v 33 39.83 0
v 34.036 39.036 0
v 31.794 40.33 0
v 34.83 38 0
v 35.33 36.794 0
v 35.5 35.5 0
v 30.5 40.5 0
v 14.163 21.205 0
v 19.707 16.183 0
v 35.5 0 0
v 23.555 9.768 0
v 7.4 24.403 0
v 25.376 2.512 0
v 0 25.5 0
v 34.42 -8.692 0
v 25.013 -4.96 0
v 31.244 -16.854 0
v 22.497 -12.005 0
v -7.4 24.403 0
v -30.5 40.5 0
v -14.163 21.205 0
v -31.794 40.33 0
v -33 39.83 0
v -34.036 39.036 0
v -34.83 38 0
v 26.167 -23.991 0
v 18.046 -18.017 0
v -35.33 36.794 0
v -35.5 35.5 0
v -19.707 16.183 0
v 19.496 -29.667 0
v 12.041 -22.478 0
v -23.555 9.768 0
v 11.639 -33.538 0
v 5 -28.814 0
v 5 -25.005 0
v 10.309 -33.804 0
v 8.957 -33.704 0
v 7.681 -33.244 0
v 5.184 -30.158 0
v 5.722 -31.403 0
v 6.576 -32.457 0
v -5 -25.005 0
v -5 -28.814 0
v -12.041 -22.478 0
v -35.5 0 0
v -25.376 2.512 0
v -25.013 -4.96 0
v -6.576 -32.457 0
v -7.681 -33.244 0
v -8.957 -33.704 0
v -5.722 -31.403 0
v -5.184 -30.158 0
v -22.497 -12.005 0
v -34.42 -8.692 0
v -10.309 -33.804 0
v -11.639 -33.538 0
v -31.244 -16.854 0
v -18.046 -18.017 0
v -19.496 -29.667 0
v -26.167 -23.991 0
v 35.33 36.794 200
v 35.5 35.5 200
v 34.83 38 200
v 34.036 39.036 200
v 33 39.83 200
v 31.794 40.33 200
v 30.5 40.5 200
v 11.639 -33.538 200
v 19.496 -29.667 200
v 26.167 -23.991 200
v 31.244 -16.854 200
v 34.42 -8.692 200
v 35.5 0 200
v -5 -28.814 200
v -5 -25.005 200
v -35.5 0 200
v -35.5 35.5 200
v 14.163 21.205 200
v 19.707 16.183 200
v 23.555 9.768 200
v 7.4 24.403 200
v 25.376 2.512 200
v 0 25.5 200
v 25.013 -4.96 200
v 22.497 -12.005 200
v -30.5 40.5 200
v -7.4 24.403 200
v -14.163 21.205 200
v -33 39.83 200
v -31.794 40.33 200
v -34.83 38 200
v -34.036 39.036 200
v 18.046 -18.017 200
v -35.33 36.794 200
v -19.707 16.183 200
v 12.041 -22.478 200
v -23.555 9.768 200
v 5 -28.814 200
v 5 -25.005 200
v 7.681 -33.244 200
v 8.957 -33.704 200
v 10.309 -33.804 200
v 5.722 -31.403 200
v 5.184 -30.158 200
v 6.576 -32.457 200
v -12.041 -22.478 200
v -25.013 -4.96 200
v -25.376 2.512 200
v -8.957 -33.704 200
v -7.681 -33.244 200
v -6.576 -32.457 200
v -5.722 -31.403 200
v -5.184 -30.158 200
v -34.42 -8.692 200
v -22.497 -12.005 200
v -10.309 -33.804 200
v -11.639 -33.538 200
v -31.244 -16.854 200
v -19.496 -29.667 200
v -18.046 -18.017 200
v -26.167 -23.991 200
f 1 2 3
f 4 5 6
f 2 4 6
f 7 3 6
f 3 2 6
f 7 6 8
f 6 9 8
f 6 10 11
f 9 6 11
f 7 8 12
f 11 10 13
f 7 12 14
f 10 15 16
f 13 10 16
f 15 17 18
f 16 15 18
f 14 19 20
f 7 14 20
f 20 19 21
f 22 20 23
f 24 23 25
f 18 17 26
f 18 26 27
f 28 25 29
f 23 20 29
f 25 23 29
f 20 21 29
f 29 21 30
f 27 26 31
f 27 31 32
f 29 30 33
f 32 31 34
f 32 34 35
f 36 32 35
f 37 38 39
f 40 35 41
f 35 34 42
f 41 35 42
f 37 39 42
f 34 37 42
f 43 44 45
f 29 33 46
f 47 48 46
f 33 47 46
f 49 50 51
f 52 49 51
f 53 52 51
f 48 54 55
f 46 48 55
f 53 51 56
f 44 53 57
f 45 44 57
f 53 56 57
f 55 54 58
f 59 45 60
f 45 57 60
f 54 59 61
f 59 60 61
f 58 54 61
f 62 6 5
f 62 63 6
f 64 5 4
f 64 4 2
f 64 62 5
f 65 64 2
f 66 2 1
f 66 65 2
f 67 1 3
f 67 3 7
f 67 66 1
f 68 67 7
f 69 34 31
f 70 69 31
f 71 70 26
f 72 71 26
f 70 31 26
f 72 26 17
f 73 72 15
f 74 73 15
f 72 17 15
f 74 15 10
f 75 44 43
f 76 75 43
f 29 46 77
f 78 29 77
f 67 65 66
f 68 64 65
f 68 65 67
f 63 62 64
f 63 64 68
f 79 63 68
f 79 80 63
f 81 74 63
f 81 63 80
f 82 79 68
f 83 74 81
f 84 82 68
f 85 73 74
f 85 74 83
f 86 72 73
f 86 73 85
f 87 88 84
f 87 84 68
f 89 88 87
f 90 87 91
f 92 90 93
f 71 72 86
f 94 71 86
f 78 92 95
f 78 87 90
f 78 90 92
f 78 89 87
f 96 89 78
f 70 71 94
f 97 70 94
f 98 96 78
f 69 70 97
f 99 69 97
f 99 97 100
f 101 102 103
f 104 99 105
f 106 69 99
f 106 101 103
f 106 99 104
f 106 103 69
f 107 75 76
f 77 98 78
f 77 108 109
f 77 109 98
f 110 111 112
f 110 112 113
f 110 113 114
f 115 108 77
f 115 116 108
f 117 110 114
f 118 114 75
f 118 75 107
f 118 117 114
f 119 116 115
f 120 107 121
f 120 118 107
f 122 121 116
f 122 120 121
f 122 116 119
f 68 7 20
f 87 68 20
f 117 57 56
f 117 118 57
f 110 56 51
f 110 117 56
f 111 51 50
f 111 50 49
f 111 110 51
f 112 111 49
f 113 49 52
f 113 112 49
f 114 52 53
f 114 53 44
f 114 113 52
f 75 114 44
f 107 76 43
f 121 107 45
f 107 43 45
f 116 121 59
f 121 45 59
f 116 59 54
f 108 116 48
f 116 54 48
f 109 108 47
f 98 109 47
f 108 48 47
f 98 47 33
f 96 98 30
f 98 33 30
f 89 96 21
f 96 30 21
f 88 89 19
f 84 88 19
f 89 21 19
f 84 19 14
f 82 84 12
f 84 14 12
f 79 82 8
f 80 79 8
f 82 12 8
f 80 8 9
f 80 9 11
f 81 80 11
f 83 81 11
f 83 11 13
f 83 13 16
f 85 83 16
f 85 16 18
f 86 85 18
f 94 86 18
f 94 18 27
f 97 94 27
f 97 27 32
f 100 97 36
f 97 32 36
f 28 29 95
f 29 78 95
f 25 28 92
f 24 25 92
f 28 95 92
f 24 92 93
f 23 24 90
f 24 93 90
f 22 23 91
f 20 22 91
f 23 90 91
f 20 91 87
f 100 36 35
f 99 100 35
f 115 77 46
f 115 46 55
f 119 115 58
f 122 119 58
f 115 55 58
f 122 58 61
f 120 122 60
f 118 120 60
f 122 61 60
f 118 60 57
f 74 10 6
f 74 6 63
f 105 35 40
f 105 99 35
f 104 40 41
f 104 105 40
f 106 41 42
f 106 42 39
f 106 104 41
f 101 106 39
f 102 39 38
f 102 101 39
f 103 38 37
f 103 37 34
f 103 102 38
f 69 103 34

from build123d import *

# Parameters (mm, degrees)
F1_DEPTH = 200
F2_R     = 5
F3_DEPTH = 5
F4_R     = 5


with BuildPart() as f1:
    # F0 (on Top) → F1 (new body)
    with BuildSketch(Plane.XY):
        with BuildLine():
            ThreePointArc((-5, -25.0049995001), (0, 25.5), (5, -25.0049995001))
            Line((5, -25.0049995001), (5, -35.1461235416))
            ThreePointArc((5, -35.1461235416), (26.8118443976, -23.2674665574), (35.5, 0))
            Line((35.5, 0), (35.5, 35.5))
            Line((35.5, 35.5), (0, 35.5))
            Line((0, 35.5), (-35.5, 35.5))
            Line((-35.5, 35.5), (-35.5, 0))
            ThreePointArc((-35.5, 0), (-26.8118443976, -23.2674665574), (-5, -35.1461235416))
            Line((-5, -35.1461235416), (-5, -25.0049995001))
        make_face()
    extrude(amount=F1_DEPTH)

    # F2
    f2_edges = [f1.edges().sort_by_distance(p)[0] for p in [
        (-5, -35.146124, 100),
        (5, -35.146124, 100),
    ]]
    fillet(f2_edges, radius=F2_R)

    # F3 (add): a face of the model
    f3_faces = [f1.faces().sort_by_distance(p)[0] for p in [
        (0, 35.5, 100),
    ]]
    extrude(f3_faces, amount=F3_DEPTH)

    # F4
    f4_edges = [f1.edges().sort_by_distance(p)[0] for p in [
        (35.5, 40.5, 100),
        (-35.5, 40.5, 100),
    ]]
    fillet(f4_edges, radius=F4_R)


solid = f1.part
